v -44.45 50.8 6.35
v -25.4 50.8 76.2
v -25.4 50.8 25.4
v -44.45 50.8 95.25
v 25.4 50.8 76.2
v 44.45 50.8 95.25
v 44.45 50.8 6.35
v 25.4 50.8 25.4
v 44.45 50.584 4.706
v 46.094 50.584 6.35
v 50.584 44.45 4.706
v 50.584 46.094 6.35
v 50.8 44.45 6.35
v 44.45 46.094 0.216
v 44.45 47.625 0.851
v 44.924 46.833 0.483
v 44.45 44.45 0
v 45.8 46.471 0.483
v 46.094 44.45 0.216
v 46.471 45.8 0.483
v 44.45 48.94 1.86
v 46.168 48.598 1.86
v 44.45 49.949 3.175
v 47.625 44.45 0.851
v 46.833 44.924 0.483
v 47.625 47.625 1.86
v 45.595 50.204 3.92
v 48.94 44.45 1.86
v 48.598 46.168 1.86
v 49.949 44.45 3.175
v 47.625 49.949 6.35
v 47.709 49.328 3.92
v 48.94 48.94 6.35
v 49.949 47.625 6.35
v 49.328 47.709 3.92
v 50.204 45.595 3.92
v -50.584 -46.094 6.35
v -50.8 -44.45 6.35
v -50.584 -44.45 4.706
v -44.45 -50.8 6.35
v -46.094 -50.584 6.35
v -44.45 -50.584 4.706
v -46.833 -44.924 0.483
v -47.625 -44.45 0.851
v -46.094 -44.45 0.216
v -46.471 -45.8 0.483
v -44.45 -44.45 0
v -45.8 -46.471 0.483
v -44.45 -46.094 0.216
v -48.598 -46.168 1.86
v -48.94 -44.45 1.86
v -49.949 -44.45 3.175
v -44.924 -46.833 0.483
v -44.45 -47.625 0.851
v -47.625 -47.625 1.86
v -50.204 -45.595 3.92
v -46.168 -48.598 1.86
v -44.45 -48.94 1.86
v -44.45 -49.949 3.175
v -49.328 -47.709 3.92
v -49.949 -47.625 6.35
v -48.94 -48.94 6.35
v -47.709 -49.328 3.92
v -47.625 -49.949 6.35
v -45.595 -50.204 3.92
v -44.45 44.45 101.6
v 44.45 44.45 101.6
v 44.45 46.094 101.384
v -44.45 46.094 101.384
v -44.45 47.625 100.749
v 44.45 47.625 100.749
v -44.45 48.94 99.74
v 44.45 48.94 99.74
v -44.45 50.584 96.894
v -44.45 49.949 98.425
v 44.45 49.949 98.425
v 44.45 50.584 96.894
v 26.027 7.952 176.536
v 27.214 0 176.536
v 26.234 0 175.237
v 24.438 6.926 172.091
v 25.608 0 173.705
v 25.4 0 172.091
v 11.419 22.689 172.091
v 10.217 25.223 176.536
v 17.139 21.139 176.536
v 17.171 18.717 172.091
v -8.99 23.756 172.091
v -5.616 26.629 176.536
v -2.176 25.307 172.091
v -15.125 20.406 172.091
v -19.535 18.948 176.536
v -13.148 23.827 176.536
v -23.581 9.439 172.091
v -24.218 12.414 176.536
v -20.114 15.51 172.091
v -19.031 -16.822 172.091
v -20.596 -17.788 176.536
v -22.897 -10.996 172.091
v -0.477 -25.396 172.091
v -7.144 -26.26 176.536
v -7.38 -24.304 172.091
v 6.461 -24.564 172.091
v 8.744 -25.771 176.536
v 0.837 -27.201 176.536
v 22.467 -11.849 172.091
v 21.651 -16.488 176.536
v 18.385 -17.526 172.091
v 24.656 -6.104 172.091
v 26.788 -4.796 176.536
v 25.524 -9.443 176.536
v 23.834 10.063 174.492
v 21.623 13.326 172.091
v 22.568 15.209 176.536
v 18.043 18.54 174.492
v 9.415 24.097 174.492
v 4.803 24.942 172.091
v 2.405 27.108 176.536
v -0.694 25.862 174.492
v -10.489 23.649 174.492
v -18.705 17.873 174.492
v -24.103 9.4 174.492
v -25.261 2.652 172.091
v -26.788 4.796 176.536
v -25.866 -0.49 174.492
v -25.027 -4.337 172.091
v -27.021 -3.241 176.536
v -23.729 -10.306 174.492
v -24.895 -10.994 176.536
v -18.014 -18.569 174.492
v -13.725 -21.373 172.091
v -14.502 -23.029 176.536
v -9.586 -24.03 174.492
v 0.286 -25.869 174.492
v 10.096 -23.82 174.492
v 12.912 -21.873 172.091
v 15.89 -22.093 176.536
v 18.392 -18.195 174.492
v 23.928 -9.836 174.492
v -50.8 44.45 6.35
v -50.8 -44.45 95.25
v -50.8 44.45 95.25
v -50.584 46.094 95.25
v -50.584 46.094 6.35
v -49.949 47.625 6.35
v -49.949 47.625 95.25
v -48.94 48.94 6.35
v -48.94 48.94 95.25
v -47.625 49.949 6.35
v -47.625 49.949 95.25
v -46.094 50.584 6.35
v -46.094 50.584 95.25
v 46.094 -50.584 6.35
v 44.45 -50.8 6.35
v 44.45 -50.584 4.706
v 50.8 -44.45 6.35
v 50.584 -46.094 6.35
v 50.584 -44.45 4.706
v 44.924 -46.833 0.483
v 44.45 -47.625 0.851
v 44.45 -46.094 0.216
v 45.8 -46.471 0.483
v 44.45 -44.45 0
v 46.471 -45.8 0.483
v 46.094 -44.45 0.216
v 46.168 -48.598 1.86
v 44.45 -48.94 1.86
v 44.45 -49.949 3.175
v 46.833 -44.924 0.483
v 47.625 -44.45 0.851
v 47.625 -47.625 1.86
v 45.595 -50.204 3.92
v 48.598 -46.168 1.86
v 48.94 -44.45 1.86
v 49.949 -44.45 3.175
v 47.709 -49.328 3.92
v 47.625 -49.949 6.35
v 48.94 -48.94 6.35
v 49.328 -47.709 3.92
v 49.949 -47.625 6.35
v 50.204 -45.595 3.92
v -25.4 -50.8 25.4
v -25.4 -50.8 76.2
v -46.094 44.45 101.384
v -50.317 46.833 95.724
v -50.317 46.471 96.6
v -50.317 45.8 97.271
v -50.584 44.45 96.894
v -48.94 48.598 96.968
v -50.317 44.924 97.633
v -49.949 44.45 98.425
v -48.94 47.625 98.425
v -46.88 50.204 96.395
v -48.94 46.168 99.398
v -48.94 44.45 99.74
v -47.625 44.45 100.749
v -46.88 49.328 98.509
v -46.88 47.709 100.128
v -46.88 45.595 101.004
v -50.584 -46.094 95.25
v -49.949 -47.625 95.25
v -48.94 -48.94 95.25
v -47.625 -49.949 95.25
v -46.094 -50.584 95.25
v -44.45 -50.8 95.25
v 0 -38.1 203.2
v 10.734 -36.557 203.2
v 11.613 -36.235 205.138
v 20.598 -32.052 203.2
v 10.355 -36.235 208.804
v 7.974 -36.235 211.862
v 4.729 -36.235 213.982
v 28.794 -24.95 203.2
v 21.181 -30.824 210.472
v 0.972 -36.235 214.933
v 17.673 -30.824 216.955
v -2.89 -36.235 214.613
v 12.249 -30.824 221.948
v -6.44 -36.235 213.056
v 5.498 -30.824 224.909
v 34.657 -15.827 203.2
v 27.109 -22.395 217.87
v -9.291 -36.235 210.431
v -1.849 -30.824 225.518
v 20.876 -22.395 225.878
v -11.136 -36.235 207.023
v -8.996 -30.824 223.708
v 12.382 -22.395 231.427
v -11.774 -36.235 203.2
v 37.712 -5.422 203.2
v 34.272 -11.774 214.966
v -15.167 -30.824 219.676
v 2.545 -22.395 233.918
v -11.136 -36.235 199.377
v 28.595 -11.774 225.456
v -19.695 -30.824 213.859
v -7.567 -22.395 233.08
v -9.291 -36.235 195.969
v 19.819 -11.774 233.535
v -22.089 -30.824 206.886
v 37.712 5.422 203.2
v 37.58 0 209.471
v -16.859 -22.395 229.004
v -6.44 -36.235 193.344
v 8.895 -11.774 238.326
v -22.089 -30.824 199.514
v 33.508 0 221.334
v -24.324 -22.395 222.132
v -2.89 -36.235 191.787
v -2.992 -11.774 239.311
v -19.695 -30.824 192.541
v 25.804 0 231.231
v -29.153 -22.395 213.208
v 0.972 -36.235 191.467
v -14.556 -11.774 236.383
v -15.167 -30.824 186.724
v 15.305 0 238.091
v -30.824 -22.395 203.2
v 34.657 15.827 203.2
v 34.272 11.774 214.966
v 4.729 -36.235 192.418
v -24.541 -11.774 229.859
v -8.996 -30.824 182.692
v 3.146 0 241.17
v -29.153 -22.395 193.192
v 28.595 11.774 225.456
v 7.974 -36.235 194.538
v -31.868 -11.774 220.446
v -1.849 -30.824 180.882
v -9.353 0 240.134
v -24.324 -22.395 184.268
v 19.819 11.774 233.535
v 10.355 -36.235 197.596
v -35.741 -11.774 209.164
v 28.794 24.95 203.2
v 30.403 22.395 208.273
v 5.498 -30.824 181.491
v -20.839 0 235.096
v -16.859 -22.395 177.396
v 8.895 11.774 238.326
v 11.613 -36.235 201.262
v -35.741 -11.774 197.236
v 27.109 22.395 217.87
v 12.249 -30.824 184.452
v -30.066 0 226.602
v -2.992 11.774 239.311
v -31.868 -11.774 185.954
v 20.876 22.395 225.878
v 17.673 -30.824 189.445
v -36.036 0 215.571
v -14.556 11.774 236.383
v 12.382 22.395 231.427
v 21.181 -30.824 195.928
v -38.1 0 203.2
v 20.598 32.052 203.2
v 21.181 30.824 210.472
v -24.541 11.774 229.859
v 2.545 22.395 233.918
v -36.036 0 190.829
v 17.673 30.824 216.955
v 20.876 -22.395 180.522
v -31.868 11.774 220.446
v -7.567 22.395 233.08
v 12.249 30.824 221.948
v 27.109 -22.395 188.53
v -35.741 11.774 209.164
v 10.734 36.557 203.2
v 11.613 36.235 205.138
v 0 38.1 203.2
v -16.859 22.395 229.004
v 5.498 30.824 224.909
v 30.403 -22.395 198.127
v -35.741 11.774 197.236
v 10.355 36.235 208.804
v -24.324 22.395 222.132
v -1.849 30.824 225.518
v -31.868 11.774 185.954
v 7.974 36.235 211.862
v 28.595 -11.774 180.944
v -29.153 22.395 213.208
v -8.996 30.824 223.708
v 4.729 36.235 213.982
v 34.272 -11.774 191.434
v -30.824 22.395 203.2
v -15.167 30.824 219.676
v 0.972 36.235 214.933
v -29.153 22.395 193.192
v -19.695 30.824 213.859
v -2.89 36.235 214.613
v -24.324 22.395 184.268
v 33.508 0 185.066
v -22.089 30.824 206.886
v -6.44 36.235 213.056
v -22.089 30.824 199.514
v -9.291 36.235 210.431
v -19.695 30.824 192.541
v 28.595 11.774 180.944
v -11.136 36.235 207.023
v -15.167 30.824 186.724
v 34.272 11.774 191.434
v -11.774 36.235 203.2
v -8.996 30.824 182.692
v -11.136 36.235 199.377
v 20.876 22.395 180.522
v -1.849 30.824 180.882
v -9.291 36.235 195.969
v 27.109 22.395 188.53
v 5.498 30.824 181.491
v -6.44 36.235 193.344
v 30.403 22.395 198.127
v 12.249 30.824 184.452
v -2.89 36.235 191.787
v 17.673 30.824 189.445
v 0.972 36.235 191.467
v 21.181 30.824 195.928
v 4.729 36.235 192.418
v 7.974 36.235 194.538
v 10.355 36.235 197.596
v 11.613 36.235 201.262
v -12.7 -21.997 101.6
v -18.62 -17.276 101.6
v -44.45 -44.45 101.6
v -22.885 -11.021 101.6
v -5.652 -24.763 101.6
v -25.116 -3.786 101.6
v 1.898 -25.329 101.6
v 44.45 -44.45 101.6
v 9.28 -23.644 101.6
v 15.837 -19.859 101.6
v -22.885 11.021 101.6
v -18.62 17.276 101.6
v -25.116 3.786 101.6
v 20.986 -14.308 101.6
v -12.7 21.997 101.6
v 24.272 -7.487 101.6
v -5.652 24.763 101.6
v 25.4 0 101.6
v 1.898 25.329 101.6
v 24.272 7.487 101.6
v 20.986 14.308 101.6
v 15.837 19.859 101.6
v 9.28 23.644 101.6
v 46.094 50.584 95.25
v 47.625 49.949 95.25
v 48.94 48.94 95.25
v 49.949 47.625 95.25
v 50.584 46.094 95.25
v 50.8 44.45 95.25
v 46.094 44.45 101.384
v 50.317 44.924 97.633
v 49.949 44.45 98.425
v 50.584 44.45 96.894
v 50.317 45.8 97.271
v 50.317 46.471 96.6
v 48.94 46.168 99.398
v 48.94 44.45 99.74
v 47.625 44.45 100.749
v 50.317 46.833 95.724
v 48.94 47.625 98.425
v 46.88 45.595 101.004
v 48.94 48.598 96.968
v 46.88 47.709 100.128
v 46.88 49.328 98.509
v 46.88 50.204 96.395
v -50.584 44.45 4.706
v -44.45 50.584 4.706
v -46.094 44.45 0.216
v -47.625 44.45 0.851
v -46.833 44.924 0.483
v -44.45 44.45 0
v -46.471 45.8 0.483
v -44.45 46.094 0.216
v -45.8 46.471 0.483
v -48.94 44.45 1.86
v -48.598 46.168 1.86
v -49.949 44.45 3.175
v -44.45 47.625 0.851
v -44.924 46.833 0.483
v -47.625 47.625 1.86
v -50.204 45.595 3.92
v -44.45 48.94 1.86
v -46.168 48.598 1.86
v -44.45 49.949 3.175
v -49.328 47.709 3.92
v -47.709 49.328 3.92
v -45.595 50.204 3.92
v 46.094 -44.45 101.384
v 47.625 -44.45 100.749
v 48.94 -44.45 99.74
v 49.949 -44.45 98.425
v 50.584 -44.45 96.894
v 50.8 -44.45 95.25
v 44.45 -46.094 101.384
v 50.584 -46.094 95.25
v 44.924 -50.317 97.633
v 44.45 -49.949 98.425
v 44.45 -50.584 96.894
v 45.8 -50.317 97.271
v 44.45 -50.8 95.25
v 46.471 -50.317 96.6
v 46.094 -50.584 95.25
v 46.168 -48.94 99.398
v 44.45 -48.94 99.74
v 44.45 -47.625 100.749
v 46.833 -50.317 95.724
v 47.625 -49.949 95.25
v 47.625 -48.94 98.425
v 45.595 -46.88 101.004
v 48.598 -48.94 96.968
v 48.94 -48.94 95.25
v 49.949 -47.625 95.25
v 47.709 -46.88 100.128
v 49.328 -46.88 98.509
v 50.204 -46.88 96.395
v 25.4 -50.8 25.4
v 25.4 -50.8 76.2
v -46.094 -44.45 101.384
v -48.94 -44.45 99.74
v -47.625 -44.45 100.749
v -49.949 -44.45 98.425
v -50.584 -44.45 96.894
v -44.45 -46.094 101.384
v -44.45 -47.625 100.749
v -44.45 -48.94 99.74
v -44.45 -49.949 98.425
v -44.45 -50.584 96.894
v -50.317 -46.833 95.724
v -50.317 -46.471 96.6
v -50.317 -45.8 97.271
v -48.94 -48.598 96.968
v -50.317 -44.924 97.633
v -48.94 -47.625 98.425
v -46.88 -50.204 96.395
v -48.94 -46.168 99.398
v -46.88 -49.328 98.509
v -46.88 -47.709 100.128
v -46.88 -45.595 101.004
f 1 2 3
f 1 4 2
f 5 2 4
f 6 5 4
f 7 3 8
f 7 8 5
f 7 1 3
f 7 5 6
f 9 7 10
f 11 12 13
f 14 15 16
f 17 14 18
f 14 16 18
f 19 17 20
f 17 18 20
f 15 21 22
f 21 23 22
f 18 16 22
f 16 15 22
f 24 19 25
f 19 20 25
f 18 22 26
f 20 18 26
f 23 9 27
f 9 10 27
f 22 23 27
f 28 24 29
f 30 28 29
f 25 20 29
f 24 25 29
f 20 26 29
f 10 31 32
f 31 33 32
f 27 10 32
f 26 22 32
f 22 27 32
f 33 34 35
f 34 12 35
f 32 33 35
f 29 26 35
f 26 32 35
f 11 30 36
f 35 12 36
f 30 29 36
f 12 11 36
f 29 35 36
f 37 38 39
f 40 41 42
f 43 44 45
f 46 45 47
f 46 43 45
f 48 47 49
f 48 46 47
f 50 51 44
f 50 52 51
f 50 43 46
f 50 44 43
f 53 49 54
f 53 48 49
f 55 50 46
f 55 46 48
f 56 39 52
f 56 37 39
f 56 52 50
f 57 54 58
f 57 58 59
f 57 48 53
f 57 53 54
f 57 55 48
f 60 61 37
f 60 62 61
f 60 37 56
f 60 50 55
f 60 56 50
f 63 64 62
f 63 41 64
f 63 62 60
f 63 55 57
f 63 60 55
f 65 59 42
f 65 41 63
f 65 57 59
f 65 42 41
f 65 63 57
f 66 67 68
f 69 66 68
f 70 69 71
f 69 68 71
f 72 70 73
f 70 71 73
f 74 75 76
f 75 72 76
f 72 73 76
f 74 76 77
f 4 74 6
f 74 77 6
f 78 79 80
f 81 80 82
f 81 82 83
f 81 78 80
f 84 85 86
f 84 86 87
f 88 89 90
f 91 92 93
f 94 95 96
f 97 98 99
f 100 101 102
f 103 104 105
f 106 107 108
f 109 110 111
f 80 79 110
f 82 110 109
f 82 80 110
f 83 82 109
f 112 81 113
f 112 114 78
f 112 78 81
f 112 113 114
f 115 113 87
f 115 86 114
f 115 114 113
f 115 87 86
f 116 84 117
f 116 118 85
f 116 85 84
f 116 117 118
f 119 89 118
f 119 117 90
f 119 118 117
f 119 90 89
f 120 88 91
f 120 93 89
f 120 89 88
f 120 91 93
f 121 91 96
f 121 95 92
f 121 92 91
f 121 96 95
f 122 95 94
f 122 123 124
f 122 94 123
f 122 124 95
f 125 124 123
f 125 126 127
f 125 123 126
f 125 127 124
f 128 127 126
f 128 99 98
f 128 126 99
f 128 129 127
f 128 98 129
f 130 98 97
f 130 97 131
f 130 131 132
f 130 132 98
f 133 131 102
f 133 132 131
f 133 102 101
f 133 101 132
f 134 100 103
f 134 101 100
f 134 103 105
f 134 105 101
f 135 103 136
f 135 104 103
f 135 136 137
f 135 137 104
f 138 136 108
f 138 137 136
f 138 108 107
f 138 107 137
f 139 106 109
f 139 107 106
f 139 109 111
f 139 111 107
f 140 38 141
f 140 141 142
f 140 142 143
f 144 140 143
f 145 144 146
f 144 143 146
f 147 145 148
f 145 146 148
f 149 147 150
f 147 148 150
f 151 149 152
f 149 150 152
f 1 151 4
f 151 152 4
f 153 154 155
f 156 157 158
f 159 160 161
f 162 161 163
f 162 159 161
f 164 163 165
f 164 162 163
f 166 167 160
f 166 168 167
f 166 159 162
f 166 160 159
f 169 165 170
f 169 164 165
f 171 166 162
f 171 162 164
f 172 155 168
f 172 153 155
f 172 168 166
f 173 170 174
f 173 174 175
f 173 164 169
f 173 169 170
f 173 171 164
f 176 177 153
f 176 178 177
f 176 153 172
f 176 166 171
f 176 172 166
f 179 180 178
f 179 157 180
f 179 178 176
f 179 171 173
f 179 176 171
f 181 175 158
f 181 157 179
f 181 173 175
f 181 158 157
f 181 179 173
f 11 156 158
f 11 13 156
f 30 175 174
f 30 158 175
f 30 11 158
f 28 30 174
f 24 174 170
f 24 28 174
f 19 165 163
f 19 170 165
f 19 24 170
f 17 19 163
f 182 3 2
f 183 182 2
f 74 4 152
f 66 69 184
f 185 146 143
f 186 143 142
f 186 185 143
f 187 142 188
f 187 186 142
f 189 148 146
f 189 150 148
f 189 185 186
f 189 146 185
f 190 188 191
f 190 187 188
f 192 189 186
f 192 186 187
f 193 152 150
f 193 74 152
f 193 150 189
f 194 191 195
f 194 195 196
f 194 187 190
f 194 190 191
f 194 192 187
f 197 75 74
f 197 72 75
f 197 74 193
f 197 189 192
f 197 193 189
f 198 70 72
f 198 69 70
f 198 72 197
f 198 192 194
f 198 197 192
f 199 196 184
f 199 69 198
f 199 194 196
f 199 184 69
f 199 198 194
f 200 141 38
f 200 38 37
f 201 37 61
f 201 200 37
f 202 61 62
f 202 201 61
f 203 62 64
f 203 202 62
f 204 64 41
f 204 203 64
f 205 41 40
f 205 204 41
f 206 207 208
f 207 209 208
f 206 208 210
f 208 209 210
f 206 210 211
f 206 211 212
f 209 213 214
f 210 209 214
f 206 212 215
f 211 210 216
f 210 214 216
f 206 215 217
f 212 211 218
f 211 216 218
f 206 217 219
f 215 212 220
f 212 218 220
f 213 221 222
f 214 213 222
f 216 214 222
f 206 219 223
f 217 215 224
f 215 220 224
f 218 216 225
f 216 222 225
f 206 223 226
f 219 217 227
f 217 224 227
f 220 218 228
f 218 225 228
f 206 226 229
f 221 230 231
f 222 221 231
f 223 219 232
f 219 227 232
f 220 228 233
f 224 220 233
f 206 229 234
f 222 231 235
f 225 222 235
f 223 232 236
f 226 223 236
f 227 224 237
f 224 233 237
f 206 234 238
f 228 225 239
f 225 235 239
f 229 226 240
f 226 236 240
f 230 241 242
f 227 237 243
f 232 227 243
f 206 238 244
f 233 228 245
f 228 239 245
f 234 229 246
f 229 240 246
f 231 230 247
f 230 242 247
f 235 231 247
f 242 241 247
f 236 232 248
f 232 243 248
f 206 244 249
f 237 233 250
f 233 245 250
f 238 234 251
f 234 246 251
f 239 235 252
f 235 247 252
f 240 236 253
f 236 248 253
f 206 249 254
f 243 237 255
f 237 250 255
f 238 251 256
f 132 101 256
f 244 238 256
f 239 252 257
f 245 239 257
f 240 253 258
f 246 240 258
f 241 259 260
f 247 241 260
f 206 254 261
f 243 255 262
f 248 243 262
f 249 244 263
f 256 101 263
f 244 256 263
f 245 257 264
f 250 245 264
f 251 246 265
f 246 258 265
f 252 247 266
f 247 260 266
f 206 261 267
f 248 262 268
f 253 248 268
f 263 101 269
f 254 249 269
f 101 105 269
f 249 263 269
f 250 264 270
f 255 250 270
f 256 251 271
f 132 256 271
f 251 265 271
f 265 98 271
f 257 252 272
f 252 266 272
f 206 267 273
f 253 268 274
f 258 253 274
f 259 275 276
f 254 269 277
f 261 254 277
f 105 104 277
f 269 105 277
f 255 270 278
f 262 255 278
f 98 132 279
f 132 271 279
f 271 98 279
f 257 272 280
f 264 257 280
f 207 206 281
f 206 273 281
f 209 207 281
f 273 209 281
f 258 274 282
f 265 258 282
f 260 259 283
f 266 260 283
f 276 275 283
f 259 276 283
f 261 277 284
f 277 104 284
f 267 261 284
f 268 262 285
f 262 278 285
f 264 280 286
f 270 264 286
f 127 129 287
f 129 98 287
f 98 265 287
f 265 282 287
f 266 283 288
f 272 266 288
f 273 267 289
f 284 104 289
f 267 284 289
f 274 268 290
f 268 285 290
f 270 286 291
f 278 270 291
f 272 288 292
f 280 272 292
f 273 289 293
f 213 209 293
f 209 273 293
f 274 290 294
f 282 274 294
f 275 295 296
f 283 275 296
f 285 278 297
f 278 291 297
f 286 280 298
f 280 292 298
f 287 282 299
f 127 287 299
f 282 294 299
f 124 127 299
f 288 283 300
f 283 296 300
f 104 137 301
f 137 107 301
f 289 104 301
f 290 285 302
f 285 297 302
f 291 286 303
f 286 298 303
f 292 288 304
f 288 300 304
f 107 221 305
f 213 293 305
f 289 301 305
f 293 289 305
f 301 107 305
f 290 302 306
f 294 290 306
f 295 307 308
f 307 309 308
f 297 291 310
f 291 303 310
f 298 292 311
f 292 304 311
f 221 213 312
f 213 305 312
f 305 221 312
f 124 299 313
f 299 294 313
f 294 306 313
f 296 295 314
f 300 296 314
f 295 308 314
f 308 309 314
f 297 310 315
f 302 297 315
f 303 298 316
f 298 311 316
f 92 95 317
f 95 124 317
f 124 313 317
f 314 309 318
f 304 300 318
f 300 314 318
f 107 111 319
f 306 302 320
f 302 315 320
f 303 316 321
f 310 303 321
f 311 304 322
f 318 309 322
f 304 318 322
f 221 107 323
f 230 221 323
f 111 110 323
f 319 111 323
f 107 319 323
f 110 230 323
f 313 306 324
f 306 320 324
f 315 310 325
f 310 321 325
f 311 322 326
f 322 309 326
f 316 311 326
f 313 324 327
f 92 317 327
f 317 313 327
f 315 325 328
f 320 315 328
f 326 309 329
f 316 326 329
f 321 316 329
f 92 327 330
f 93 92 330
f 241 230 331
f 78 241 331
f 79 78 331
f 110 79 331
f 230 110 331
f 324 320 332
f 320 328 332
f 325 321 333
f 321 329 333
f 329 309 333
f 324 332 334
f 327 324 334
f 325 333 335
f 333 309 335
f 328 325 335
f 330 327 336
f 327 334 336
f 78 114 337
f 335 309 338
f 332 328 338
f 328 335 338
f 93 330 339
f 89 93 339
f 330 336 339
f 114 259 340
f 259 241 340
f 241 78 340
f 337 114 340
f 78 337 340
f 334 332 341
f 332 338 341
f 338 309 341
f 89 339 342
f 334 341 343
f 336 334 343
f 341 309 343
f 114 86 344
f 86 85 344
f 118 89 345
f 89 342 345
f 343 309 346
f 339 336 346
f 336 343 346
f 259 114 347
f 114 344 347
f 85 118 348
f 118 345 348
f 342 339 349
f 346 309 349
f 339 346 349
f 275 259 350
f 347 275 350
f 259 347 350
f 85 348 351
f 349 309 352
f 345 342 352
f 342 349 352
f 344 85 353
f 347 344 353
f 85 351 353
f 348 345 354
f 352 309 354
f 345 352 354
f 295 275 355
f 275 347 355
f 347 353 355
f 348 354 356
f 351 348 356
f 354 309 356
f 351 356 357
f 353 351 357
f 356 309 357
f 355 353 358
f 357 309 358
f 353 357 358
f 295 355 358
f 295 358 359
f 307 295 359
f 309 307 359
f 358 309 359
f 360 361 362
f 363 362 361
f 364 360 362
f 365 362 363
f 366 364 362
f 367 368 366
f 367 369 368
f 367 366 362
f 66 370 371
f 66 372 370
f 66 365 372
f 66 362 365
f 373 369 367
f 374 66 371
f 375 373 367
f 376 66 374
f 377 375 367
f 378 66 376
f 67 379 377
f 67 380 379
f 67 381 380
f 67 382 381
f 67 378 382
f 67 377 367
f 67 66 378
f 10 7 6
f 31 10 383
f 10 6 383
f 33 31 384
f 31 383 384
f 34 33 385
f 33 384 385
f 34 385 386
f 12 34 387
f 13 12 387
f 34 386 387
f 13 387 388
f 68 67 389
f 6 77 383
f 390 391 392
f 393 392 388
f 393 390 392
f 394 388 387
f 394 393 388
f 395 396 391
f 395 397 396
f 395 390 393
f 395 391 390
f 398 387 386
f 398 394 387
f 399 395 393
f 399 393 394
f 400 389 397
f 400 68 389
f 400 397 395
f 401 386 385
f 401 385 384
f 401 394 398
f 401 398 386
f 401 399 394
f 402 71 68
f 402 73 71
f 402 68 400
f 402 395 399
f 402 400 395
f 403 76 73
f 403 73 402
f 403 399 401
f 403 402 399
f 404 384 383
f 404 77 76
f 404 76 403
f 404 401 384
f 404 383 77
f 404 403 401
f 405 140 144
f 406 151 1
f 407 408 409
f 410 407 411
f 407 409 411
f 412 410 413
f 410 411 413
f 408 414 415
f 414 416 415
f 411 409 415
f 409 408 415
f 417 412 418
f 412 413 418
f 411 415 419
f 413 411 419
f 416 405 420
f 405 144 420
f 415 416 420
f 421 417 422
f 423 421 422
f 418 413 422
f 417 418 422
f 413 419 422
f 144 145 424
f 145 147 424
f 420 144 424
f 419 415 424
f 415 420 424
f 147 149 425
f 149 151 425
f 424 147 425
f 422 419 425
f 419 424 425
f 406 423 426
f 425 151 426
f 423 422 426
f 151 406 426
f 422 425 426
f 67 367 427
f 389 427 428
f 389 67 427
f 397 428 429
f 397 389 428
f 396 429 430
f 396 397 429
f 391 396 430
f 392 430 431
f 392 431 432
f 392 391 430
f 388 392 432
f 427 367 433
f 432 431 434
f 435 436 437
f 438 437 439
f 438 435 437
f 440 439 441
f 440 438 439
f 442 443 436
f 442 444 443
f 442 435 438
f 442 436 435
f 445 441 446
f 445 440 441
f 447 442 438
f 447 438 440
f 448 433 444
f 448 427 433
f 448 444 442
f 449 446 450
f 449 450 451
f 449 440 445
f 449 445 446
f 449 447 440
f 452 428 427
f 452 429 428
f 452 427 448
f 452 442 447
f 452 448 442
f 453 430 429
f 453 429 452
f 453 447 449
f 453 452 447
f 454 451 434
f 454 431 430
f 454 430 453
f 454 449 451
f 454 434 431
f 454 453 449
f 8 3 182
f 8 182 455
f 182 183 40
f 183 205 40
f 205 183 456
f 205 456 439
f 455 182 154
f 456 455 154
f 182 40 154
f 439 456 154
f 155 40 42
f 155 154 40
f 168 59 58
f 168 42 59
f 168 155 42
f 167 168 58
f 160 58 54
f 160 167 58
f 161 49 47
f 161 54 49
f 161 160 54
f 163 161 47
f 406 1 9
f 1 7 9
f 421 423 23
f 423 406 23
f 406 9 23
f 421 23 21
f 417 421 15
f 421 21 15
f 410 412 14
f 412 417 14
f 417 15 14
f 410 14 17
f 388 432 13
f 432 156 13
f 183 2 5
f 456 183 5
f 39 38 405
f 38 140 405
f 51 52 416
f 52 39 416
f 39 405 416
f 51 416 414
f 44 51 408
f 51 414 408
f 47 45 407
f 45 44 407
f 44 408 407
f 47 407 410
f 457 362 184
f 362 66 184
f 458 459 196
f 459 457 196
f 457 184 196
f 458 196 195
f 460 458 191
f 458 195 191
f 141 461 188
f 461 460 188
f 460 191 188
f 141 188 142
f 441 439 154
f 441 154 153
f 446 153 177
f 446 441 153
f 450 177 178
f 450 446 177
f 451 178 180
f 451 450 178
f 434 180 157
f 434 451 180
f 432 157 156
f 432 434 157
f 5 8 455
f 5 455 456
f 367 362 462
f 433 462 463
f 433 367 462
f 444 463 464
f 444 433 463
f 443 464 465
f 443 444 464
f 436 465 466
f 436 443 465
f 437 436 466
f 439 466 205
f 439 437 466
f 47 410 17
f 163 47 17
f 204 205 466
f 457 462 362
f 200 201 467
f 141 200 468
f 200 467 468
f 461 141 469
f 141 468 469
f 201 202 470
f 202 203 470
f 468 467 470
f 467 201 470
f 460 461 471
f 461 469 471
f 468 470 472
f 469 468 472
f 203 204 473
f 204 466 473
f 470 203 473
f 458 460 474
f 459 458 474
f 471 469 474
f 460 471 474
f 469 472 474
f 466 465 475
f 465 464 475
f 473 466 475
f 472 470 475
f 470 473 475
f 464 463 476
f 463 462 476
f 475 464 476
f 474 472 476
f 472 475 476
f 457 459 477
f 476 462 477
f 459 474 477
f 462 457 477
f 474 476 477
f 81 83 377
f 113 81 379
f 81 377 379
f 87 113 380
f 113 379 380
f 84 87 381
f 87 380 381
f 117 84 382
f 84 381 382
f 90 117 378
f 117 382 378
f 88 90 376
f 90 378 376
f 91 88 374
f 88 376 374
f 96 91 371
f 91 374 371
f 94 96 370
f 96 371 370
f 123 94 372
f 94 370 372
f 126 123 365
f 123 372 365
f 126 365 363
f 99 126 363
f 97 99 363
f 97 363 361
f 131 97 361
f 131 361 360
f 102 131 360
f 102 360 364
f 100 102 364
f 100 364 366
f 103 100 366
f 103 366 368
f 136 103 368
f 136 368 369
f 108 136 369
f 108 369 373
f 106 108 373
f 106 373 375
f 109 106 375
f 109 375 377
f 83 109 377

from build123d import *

# Parameters (mm, degrees)
F0_W     = 101.6
F0_H     = 101.6
F1_DEPTH = 101.6
F2_R     = 25.4
F3_DEPTH = 101.6
F6_W     = 50.8
F6_H     = 50.8
F7_DEPTH = 101.6
F8_R     = 6.35


with BuildPart() as f1:
    # F0 (on Top) → F1 (new body)
    with BuildSketch(Plane.XY):
        Rectangle(F0_W, F0_H)
    extrude(amount=F1_DEPTH)

    # F2 (on face) → F3 (join)
    with BuildSketch(Plane.XY.offset(101.6)):
        Circle(F2_R)
    extrude(amount=F3_DEPTH)

    # F4 (on face) → F5 (revolve)
    with BuildSketch(Plane.XY.offset(203.2)):
        with BuildLine():
            Line((0, -25.4), (0, -38.1))
            ThreePointArc((0, -38.1), (38.1, 0), (0, 38.1))
            Line((0, 38.1), (0, 25.4))
            ThreePointArc((0, 25.4), (17.9605122421, 17.9605122421), (25.4, 0))
            ThreePointArc((25.4, 0), (17.9605122421, -17.9605122421), (0, -25.4))
        make_face()
        with BuildLine():
            Line((0, 25.4), (0, -25.4))
            ThreePointArc((0, -25.4), (17.9605122421, -17.9605122421), (25.4, 0))
            ThreePointArc((25.4, 0), (17.9605122421, 17.9605122421), (0, 25.4))
        make_face()
    revolve(axis=Axis((0, 0, 203.2), (0, -1, 0)))

    # F6 (on face) → F7 (cut)
    with BuildSketch(Plane.XZ.offset(50.8)):
        with Locations((0, 50.8)):
            Rectangle(F6_W, F6_H)
    extrude(amount=-F7_DEPTH, mode=Mode.SUBTRACT)

    # F8
    f8_edges = [f1.edges().sort_by_distance(p)[0] for p in [
        (0, 50.8, 101.6),
        (50.8, 0, 101.6),
        (0, -50.8, 101.6),
        (-50.8, 50.8, 50.8),
        (-50.8, -50.8, 50.8),
        (-50.8, 0, 0),
        (-50.8, 0, 101.6),
        (50.8, 50.8, 50.8),
        (0, 50.8, 0),
        (50.8, -50.8, 50.8),
        (0, -50.8, 0),
        (50.8, 0, 0),
        (-25.4, 0, 174.801937),
    ]]
    fillet(f8_edges, radius=F8_R)


solid = f1.part
